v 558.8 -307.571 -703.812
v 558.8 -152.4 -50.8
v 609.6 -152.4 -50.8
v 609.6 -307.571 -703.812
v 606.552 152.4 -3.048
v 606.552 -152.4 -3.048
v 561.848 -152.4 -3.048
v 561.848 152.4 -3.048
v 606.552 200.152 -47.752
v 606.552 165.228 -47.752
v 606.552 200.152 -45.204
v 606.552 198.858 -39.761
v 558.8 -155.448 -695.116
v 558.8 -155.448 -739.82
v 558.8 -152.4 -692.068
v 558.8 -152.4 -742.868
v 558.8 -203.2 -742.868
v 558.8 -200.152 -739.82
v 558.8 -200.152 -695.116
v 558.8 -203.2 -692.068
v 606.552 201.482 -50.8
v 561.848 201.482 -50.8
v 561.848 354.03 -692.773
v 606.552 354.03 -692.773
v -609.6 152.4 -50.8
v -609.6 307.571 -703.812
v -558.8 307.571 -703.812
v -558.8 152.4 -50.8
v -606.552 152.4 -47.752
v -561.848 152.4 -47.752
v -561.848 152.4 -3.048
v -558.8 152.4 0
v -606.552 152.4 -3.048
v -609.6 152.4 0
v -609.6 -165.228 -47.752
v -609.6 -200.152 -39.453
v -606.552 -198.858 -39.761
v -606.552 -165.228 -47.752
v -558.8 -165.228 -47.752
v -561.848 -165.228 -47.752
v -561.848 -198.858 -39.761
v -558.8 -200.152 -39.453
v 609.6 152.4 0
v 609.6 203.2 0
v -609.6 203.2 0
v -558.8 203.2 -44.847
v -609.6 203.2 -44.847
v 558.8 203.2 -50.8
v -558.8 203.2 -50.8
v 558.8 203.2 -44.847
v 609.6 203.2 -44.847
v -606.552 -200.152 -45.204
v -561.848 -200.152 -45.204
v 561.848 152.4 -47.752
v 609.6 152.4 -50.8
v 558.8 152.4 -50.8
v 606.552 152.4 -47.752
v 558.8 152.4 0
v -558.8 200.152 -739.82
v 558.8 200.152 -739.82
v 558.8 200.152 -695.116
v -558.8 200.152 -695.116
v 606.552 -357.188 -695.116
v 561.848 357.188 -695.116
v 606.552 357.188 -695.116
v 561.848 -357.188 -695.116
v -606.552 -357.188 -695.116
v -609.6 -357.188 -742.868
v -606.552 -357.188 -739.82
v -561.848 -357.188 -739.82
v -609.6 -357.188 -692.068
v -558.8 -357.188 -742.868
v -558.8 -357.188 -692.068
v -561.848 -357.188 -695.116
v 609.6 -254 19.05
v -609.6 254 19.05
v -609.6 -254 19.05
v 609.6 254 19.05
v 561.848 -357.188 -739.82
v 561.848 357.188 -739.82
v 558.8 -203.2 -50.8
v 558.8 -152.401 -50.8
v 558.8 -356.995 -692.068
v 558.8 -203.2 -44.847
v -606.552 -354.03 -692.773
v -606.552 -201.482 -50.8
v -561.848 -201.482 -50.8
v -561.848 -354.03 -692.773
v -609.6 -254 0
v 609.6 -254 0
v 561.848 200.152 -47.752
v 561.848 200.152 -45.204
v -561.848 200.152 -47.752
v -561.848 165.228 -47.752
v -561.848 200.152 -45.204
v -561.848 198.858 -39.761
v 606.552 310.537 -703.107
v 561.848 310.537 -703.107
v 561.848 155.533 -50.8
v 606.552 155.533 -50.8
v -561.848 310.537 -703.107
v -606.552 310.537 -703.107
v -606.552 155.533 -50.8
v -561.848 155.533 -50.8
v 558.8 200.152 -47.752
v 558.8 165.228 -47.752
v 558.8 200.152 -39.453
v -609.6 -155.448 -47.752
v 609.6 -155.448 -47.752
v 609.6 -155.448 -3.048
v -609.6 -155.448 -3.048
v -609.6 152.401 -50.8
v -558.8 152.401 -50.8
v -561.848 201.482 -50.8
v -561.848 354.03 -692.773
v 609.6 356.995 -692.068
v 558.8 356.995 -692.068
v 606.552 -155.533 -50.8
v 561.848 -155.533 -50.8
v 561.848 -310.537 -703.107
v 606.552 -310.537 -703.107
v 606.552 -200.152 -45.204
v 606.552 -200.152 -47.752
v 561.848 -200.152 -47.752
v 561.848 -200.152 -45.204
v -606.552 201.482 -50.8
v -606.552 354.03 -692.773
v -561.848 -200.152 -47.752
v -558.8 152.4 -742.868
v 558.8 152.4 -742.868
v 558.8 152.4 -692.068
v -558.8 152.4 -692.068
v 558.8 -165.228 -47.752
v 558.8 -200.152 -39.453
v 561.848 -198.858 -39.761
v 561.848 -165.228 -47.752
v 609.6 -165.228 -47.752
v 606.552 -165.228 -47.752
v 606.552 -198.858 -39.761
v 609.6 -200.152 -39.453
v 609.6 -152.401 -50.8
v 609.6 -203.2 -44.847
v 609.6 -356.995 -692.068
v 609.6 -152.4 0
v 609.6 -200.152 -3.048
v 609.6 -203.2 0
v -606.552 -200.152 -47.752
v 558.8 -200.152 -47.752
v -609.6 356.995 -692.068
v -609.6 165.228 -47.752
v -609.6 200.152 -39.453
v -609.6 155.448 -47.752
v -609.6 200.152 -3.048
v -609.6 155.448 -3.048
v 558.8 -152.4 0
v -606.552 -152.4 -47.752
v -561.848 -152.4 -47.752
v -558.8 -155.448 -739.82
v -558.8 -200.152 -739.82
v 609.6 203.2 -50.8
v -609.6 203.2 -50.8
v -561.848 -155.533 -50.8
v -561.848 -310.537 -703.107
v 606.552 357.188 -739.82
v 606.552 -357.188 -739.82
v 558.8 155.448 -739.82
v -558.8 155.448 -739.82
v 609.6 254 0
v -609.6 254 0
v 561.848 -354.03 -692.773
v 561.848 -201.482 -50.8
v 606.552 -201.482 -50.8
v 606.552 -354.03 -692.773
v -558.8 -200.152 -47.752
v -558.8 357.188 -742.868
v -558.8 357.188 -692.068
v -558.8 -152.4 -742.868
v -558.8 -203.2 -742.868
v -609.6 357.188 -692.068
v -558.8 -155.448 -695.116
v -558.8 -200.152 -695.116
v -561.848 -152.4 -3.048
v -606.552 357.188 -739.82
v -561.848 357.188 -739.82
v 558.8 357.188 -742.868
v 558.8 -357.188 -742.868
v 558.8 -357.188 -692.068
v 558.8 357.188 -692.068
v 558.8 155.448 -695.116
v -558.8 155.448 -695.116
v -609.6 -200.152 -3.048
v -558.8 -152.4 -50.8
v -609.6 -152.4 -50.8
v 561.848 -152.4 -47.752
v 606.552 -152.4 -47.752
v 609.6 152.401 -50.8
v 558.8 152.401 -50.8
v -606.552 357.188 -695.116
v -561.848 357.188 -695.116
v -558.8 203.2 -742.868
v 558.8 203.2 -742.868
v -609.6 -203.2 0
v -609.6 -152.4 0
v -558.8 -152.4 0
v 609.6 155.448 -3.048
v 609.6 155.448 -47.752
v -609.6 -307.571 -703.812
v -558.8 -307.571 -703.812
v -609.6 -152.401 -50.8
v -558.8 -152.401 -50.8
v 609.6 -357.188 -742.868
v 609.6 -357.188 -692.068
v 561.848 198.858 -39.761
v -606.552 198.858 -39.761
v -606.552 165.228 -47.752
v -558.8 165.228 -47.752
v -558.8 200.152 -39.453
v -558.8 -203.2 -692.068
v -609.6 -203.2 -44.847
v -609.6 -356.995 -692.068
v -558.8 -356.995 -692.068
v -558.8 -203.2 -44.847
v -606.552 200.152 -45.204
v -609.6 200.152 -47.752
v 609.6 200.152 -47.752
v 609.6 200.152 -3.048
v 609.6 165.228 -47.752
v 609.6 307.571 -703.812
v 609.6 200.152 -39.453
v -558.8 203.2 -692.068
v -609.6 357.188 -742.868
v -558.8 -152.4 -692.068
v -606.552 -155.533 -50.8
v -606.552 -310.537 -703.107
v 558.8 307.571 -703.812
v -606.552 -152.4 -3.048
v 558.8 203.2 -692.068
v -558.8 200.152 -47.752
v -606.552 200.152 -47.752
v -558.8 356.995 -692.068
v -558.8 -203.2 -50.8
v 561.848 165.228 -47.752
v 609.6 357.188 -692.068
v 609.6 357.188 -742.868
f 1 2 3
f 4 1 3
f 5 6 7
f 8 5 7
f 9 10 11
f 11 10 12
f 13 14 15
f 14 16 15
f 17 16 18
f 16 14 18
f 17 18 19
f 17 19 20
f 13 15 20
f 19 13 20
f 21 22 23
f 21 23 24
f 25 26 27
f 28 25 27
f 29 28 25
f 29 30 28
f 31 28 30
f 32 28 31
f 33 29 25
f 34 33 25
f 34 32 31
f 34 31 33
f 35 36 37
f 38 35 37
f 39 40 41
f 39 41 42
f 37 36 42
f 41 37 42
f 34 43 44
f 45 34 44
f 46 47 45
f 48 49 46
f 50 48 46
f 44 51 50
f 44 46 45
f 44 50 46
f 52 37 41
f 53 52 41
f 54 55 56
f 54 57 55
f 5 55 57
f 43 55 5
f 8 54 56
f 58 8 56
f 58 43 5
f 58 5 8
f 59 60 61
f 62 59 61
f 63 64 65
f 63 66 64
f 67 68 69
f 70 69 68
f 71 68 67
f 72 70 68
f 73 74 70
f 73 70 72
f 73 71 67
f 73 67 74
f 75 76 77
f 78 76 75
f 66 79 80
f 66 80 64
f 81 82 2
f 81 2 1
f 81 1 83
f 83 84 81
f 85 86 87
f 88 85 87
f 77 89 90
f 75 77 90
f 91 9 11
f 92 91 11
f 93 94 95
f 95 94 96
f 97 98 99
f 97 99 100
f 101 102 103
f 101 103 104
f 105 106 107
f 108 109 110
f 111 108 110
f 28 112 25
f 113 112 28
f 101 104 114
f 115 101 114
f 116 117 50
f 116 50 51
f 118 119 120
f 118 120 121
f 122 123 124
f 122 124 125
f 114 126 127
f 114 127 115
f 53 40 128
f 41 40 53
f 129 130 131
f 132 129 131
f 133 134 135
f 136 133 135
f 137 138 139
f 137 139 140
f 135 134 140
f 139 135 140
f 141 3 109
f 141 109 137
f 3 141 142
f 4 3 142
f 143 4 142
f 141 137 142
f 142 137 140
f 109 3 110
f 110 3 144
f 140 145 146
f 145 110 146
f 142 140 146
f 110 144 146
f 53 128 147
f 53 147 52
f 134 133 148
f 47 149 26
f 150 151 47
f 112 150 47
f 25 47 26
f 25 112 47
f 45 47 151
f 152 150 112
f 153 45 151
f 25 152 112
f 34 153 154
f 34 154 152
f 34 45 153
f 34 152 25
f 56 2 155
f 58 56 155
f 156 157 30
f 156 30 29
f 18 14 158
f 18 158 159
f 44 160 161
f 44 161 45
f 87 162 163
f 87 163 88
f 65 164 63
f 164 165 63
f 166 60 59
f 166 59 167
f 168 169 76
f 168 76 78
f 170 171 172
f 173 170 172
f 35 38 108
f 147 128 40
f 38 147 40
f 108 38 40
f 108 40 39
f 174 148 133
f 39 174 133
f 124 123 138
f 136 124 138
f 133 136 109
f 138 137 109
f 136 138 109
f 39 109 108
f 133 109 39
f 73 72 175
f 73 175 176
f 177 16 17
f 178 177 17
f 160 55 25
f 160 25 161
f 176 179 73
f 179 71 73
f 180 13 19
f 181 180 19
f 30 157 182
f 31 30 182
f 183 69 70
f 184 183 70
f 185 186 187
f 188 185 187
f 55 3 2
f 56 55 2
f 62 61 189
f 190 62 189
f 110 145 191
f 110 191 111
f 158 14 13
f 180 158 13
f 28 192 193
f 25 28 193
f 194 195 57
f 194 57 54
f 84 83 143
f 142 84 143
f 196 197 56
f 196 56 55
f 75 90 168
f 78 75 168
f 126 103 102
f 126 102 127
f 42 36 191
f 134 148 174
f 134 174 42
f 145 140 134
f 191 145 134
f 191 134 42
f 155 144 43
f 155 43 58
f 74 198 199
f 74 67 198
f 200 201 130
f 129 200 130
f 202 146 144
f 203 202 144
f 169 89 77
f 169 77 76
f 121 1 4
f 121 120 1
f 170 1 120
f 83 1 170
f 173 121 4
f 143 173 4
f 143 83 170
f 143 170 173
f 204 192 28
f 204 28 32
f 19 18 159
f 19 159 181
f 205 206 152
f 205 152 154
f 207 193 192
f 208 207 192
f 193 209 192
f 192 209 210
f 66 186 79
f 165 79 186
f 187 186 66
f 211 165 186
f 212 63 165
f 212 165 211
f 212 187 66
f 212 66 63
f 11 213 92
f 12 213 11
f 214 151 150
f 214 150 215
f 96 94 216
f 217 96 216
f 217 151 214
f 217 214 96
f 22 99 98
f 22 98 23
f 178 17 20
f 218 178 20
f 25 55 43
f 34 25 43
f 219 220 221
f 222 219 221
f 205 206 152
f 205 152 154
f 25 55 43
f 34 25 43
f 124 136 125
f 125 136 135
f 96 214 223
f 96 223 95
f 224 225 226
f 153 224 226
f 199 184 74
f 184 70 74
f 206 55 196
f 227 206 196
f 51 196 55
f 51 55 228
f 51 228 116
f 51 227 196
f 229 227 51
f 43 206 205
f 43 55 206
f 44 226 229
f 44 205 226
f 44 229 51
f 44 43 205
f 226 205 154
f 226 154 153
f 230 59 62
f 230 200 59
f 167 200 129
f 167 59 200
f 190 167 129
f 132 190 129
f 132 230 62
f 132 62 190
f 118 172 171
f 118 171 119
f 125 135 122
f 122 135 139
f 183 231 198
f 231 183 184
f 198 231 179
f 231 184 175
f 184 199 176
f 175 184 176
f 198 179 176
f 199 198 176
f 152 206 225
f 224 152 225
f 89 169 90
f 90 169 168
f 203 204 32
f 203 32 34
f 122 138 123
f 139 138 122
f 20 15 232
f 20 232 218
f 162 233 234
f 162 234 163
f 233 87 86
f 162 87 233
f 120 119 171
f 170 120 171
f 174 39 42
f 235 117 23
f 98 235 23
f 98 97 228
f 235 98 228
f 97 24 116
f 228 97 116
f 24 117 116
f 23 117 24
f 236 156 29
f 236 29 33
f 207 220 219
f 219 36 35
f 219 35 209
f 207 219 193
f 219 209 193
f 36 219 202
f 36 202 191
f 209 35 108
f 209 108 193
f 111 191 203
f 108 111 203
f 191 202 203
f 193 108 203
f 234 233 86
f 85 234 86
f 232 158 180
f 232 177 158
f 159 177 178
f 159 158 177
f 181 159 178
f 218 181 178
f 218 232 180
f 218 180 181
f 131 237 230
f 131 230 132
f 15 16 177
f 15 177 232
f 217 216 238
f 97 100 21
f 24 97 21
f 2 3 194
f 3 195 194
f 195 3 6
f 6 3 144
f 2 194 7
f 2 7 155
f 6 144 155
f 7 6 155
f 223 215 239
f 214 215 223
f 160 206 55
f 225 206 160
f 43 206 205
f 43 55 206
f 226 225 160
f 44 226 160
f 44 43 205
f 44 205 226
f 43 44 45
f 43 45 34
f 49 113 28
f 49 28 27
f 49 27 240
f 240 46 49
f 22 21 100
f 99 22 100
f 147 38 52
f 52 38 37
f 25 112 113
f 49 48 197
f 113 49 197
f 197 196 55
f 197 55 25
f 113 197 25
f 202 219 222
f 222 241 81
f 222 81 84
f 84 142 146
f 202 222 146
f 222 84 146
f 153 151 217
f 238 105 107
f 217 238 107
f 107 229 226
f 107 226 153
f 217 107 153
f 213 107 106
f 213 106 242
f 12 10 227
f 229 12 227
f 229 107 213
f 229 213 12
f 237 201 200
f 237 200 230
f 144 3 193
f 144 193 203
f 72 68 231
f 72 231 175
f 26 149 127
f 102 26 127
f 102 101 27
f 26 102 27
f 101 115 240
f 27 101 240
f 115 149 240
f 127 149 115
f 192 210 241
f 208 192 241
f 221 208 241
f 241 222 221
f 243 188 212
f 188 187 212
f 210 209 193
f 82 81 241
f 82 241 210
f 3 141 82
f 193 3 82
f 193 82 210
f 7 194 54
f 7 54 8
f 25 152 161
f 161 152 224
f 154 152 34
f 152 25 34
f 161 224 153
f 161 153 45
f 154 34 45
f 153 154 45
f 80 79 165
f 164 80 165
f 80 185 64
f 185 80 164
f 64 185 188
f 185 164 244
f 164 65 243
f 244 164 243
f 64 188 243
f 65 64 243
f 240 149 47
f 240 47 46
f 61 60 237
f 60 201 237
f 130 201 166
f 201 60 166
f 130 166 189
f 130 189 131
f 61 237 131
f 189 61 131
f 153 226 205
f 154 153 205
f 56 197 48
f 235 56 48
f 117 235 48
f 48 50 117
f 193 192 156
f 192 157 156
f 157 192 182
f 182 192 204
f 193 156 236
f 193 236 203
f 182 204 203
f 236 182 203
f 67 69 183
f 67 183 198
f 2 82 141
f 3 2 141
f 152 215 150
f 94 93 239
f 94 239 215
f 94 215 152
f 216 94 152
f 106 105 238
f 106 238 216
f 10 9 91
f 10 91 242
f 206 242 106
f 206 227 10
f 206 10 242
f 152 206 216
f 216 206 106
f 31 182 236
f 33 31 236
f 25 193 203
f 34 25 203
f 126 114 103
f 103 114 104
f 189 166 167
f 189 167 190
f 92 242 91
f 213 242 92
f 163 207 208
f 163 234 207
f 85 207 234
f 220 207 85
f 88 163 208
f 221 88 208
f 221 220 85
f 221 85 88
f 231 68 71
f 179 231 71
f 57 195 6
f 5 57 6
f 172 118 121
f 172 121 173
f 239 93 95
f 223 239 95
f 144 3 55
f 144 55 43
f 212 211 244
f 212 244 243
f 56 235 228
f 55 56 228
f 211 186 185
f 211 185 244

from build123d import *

# Parameters (mm, degrees)
F0_W      = 1219.2
F0_H      = 508
F1_DEPTH  = 19.05
F2_W      = 50.8
F2_H      = 50.8
F2_W_2    = 44.704
F2_H_2    = 44.704
F3_DEPTH  = 1219.2
F4_W      = 50.8
F4_H      = 50.8
F4_W_2    = 44.704
F4_H_2    = 44.704
F5_DEPTH  = 304.8
F9_W      = 50.8
F9_H      = 50.8
F9_W_2    = 44.704
F9_H_2    = 44.704
F10_DEPTH = 671.195
F12_W     = 50.8
F12_H     = 50.8
F12_W_2   = 44.704
F12_H_2   = 44.704
F13_DEPTH = 357.1875
F14_W     = 50.8
F14_H     = 50.8
F14_W_2   = 44.704
F14_H_2   = 44.704
F15_DEPTH = 1117.6


with BuildPart() as f1:
    # F0 (on Top) → F1 (new body)
    with BuildSketch(Plane.XY):
        Rectangle(F0_W, F0_H)
    extrude(amount=F1_DEPTH)


with BuildPart() as f3:
    # F2 (on face) → F3 (new body)
    with BuildSketch(Plane.YZ.offset(609.6)):
        with Locations((177.8, -25.4)):
            Rectangle(F2_W, F2_H)
        with Locations((177.8, -25.4)):
            Rectangle(F2_W_2, F2_H_2, mode=Mode.SUBTRACT)
    extrude(amount=-F3_DEPTH)


with BuildPart() as f3b:
    # F2 (on face) → F3, piece 2 (new body)
    with BuildSketch(Plane.YZ.offset(609.6)):
        with Locations((-177.8, -25.4)):
            Rectangle(F2_W, F2_H)
        with Locations((-177.8, -25.4)):
            Rectangle(F2_W_2, F2_H_2, mode=Mode.SUBTRACT)
    extrude(amount=-F3_DEPTH)

    # F9 (on offset) → F10 (join)
    with BuildSketch(Plane(origin=(0, -19.571498534, -82.3633896637), x_dir=(1, 0, 0), z_dir=(0, -0.2311864096, -0.9729094737))):
        with Locations((584.2, 161.9271341849)):
            Rectangle(F9_W, F9_H)
        with Locations((584.2, 161.9271341849)):
            Rectangle(F9_W_2, F9_H_2, mode=Mode.SUBTRACT)
        with Locations((-584.2, 161.9271341849)):
            Rectangle(F9_W, F9_H)
        with Locations((-584.2, 161.9271341849)):
            Rectangle(F9_W_2, F9_H_2, mode=Mode.SUBTRACT)
    extrude(amount=F10_DEPTH)


with BuildPart() as f5:
    # F4 (on face) → F5 (new body)
    with BuildSketch(Plane(origin=(0, -152.4, 0), x_dir=(-1, 0, 0), z_dir=(0, 1, 0))):
        with Locations((-584.2, -25.4)):
            Rectangle(F4_W, F4_H)
        with Locations((-584.2, -25.4)):
            Rectangle(F4_W_2, F4_H_2, mode=Mode.SUBTRACT)
    extrude(amount=F5_DEPTH)


with BuildPart() as f5b:
    # F4 (on face) → F5, piece 2 (new body)
    with BuildSketch(Plane(origin=(0, -152.4, 0), x_dir=(-1, 0, 0), z_dir=(0, 1, 0))):
        with Locations((584.2, -25.4)):
            Rectangle(F4_W, F4_H)
        with Locations((584.2, -25.4)):
            Rectangle(F4_W_2, F4_H_2, mode=Mode.SUBTRACT)
    extrude(amount=F5_DEPTH)


with BuildPart() as f11_1:
    # F11: instance of F3b
    add(f3b.part.mirror(Plane.XZ))


with BuildPart() as f13:
    # F12 (on Front) → F13 (new body, symmetric)
    with BuildSketch(Plane.XZ):
        with Locations((584.2, -717.4678762938)):
            Rectangle(F12_W, F12_H)
        with Locations((584.2, -717.4678762938)):
            Rectangle(F12_W_2, F12_H_2, mode=Mode.SUBTRACT)
    extrude(amount=F13_DEPTH, both=True)


with BuildPart() as f13b:
    # F12 (on Front) → F13, piece 2 (new body, symmetric)
    with BuildSketch(Plane.XZ):
        with Locations((-584.2, -717.4678762938)):
            Rectangle(F12_W, F12_H)
        with Locations((-584.2, -717.4678762938)):
            Rectangle(F12_W_2, F12_H_2, mode=Mode.SUBTRACT)
    extrude(amount=F13_DEPTH, both=True)


with BuildPart() as f15:
    # F14 (on face) → F15 (new body)
    with BuildSketch(Plane(origin=(558.8, 0, 0), x_dir=(0, -1, 0), z_dir=(-1, 0, 0))):
        with Locations((-177.8, -717.4678762938)):
            Rectangle(F14_W, F14_H)
        with Locations((-177.8, -717.4678762938)):
            Rectangle(F14_W_2, F14_H_2, mode=Mode.SUBTRACT)
    extrude(amount=F15_DEPTH)


with BuildPart() as f15b:
    # F14 (on face) → F15, piece 2 (new body)
    with BuildSketch(Plane(origin=(558.8, 0, 0), x_dir=(0, -1, 0), z_dir=(-1, 0, 0))):
        with Locations((177.8, -717.4678762938)):
            Rectangle(F14_W, F14_H)
        with Locations((177.8, -717.4678762938)):
            Rectangle(F14_W_2, F14_H_2, mode=Mode.SUBTRACT)
    extrude(amount=F15_DEPTH)


solid = Compound([f1.part, f3.part, f3b.part, f5.part, f5b.part, f11_1.part, f13.part, f13b.part, f15.part, f15b.part])
